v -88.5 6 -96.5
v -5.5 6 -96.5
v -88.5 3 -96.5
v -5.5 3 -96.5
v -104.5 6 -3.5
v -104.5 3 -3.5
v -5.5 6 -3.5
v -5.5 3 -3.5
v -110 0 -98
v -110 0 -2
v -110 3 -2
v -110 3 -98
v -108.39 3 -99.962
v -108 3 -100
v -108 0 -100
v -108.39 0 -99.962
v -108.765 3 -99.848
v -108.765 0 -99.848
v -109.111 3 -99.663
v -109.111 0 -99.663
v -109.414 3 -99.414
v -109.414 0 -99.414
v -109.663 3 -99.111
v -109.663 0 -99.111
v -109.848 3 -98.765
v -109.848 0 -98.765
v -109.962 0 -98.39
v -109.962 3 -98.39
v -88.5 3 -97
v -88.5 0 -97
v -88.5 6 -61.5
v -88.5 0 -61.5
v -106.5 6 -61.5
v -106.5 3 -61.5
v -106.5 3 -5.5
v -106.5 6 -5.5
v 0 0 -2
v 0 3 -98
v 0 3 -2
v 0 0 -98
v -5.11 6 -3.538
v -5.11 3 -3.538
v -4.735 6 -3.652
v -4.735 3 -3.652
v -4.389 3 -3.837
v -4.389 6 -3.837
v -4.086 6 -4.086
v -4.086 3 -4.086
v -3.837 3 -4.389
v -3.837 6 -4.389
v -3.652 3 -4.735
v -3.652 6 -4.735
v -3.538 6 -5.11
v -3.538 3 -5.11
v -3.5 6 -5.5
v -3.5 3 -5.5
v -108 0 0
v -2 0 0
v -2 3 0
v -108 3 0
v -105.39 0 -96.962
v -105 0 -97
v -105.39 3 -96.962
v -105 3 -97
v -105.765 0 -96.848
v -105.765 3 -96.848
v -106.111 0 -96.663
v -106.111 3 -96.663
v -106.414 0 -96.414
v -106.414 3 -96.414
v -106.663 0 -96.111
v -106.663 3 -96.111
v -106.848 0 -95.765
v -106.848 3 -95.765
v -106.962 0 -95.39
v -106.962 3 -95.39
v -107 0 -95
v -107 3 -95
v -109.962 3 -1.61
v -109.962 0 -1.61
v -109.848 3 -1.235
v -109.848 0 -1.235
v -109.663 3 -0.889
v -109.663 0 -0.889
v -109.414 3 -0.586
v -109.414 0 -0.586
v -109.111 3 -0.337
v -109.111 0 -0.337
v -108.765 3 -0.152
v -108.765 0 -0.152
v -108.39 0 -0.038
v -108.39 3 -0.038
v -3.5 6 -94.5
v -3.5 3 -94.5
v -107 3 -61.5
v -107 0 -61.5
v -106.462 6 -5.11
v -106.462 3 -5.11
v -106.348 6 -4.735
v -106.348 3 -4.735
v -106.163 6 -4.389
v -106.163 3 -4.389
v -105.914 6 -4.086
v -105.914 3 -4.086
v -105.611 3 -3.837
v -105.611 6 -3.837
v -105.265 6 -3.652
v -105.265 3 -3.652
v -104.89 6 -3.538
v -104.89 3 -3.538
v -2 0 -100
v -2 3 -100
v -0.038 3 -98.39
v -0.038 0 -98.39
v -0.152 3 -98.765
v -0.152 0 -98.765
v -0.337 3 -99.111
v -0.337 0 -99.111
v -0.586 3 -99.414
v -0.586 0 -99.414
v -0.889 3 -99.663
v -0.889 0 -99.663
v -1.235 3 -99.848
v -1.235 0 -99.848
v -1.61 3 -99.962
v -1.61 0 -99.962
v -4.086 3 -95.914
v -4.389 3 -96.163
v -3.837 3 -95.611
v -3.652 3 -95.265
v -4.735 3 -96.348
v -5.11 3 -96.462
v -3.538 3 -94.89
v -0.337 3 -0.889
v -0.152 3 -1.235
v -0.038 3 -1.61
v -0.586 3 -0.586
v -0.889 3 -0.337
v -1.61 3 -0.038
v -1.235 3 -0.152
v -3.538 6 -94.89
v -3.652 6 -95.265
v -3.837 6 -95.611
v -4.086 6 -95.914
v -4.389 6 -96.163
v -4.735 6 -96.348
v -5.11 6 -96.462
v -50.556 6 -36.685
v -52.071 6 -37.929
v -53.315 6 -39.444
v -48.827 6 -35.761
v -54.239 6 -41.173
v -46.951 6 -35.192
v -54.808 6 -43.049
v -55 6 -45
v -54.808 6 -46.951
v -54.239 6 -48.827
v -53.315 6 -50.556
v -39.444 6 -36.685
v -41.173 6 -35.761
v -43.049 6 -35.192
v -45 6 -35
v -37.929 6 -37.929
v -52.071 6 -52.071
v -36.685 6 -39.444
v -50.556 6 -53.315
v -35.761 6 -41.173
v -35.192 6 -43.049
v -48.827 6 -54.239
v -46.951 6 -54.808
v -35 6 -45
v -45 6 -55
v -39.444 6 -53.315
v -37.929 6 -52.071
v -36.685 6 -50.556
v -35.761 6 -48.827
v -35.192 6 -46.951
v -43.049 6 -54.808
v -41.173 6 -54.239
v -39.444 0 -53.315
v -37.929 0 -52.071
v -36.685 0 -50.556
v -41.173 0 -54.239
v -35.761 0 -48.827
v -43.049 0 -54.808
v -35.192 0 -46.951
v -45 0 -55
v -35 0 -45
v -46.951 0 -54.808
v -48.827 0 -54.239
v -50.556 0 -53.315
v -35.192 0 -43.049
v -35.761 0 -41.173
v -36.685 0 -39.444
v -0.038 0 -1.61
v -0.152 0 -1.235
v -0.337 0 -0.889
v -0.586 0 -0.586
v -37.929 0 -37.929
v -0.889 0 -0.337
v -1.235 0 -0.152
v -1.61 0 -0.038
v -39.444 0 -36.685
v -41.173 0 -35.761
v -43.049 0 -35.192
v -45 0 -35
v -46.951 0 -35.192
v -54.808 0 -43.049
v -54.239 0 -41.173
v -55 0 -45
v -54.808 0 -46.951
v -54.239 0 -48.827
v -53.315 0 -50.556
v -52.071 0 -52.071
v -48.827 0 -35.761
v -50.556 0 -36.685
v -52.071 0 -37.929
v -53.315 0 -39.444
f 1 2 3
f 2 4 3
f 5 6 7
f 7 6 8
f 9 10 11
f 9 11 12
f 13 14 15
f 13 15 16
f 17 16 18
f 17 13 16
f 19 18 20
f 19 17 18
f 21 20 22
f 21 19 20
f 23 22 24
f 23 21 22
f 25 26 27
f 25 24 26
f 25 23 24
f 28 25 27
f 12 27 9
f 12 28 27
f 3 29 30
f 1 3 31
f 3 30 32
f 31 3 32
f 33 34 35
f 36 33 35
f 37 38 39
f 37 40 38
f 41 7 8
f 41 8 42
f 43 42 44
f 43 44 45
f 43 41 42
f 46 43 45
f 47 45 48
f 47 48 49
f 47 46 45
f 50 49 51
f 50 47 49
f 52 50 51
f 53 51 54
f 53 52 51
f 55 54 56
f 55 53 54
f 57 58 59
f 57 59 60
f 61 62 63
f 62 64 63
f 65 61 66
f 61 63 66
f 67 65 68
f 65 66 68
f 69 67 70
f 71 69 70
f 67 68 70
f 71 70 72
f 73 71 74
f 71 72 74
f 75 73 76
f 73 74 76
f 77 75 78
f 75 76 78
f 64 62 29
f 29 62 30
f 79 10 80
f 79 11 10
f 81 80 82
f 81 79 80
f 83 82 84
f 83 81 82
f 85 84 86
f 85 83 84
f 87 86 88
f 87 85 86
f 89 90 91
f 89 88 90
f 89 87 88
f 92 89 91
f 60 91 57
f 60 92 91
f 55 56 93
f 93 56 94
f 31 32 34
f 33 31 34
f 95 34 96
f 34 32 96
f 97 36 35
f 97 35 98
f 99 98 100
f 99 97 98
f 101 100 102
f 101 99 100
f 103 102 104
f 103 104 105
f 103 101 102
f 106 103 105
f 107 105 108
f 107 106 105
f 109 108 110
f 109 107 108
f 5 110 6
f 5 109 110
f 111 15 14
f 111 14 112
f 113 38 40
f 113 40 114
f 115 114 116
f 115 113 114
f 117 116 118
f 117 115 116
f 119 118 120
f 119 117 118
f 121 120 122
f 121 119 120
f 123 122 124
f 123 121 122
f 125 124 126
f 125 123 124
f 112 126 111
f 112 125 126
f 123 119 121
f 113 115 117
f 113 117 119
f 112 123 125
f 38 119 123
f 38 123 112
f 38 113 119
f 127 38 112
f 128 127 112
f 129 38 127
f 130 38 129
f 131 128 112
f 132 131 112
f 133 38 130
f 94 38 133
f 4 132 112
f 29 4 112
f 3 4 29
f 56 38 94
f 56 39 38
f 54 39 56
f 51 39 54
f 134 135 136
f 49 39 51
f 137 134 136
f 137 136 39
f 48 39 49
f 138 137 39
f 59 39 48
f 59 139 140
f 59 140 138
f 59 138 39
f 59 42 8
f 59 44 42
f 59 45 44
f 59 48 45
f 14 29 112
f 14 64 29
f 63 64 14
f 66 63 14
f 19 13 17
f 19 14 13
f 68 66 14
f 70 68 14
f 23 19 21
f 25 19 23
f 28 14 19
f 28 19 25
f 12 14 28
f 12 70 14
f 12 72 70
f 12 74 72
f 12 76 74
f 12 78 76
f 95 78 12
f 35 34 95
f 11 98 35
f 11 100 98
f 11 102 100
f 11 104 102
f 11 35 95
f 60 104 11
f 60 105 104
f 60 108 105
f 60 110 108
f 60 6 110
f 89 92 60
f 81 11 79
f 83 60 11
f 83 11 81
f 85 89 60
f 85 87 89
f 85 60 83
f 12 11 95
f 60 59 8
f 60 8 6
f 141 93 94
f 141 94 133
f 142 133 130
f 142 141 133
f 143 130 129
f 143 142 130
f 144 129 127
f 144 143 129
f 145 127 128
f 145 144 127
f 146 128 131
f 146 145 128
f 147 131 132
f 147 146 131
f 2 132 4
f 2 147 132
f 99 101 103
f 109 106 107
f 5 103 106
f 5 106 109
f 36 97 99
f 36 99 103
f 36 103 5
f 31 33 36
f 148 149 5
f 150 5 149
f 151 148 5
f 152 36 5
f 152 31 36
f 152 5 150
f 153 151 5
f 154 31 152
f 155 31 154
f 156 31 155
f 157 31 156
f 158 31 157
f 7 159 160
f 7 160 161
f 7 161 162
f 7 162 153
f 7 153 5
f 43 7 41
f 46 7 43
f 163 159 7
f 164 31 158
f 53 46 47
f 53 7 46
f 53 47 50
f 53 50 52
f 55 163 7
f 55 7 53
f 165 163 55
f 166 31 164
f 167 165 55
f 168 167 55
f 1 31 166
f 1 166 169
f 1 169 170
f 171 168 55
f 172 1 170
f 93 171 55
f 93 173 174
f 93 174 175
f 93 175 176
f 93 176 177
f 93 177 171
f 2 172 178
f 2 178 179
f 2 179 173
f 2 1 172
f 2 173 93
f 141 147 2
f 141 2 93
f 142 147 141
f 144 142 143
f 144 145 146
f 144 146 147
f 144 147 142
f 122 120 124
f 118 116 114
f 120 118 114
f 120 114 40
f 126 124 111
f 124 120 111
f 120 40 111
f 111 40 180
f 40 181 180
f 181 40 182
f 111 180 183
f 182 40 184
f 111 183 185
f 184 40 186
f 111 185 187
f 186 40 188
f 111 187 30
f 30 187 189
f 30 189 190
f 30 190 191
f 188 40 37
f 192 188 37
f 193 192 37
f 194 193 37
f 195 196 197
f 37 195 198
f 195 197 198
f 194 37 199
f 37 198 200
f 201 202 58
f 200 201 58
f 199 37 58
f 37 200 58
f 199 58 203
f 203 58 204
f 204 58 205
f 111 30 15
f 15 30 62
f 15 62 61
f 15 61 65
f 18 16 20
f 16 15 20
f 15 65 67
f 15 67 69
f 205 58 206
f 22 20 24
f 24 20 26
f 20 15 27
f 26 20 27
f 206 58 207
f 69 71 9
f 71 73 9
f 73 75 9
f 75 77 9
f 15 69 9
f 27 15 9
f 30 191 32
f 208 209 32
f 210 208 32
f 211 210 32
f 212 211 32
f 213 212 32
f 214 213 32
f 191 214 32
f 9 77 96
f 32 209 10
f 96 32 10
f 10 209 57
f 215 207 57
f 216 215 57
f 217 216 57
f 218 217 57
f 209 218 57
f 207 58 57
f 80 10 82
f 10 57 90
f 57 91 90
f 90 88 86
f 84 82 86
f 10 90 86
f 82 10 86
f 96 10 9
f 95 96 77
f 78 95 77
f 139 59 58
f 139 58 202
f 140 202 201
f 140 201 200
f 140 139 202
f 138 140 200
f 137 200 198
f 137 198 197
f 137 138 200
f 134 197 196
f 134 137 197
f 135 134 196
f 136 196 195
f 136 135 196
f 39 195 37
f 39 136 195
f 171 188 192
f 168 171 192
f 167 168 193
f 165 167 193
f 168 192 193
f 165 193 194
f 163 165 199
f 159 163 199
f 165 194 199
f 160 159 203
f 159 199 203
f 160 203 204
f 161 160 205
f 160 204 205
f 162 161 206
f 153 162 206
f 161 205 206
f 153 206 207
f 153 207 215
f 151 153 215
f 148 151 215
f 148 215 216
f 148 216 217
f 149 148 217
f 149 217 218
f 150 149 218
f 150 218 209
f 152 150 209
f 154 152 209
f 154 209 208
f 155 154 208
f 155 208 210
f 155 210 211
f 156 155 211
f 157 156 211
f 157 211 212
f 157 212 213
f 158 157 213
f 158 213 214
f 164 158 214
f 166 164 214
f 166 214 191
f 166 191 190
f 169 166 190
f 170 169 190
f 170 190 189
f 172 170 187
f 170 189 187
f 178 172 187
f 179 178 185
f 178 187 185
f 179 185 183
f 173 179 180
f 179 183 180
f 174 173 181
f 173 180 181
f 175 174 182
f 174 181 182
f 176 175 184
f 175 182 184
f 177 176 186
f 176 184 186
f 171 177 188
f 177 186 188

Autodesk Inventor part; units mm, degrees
ref_plane "YZ Plane" through (0, 0, 0) normal (1, 0, 0) x (0, 1, 0)
ref_plane "XZ Plane" through (0, 0, 0) normal (0, 1, 0) x (-1, 0, 0)
ref_plane "XY Plane" through (0, 0, 0) normal (0, 0, 1) x (1, 0, 0)
sketch "Sketch1" plane through (0, 0, 0) normal (0, 1, 0) x (-1, 0, 0)
  line L0 (0, 0) -> (110, 0)
  line L1 (110, 0) -> (110, -100)
  line L2 (110, -100) -> (0, -100)
  line L3 (0, -100) -> (0, 0)
  dimension "d0" = 100
  dimension "d1" = 110
extrude "Extrusion1" add sketch "Sketch1" along normal blind 3
sketch "Sketch2" plane through (0, 3, 0) normal (0, 1, 0) x (1, 0, 0)
  line L0 (-106.5, 3.5) -> (-3.5, 3.5)
  line L1 (-3.5, 3.5) -> (-3.5, 96.5)
  line L2 (-3.5, 96.5) -> (-106.5, 96.5)
  line L3 (-106.5, 96.5) -> (-106.5, 3.5)
  line L4 (-110, 100) -> (-110, 0) projected
  line L5 (-110, 0) -> (0, 0) projected
  line L6 (0, 100) -> (-110, 100) projected
  line L7 (0, 0) -> (0, 100) projected
  dimension "d4" = 3.5
  dimension "d5" = 3.5
  dimension "d6" = 3.5
  dimension "d7" = 3.5
extrude "Extrusion2" add sketch "Sketch2" along normal blind 3 contours L3 L2 L1 L0
fillet "Fillet1" radius 2 8 edges at (0, 1.5, 0) (-3.5, 4.5, -3.5) (-110, 1.5, 0) (-106.5, 4.5, -3.5) (-106.5, 4.5, -96.5) (-110, 1.5, -100) (-3.5, 4.5, -96.5) (0, 1.5, -100)
sketch "Sketch3" plane through (0, 0, 0) normal (0, -1, 0) x (1, 0, 0)
  line L0 (-107, -97) -> (-88.5, -97)
  line L1 (-88.5, -97) -> (-88.5, -61.5)
  line L2 (-88.5, -61.5) -> (-107, -61.5)
  line L3 (-107, -61.5) -> (-107, -97)
  line L4 (-108, -100) -> (-2, -100) projected
  line L5 (-110, -2) -> (-110, -98) projected
  point P0 (0, 0)
  dimension "d11" = 35.5
  dimension "d12" = 18.5
  dimension "d13" = 3
  dimension "d14" = 3
extrude "Extrusion3" cut sketch "Sketch3" against normal blind 10
fillet "Fillet2" radius 2 1 edges at (-107, 1.5, -97)
sketch "Sketch4" plane through (0, 0, 0) normal (0, -1, 0) x (1, 0, 0)
  circle A0 centre (-45, -45) radius 10
  line L0 (0, -98) -> (0, -2) projected
  line L1 (-2, 0) -> (-108, 0) projected
  point P0 (0, 0)
  dimension "d18" = 20
  dimension "d20" = 45
  dimension "d21" = 45
extrude "Extrusion4" cut sketch "Sketch4" against normal blind 10
sketch "Sketch5" plane through (0, 0, 0) normal (0, -1, 0) x (1, 0, 0)
  point P0 (0, 0)
properties part number "StaniceBoxTop"
